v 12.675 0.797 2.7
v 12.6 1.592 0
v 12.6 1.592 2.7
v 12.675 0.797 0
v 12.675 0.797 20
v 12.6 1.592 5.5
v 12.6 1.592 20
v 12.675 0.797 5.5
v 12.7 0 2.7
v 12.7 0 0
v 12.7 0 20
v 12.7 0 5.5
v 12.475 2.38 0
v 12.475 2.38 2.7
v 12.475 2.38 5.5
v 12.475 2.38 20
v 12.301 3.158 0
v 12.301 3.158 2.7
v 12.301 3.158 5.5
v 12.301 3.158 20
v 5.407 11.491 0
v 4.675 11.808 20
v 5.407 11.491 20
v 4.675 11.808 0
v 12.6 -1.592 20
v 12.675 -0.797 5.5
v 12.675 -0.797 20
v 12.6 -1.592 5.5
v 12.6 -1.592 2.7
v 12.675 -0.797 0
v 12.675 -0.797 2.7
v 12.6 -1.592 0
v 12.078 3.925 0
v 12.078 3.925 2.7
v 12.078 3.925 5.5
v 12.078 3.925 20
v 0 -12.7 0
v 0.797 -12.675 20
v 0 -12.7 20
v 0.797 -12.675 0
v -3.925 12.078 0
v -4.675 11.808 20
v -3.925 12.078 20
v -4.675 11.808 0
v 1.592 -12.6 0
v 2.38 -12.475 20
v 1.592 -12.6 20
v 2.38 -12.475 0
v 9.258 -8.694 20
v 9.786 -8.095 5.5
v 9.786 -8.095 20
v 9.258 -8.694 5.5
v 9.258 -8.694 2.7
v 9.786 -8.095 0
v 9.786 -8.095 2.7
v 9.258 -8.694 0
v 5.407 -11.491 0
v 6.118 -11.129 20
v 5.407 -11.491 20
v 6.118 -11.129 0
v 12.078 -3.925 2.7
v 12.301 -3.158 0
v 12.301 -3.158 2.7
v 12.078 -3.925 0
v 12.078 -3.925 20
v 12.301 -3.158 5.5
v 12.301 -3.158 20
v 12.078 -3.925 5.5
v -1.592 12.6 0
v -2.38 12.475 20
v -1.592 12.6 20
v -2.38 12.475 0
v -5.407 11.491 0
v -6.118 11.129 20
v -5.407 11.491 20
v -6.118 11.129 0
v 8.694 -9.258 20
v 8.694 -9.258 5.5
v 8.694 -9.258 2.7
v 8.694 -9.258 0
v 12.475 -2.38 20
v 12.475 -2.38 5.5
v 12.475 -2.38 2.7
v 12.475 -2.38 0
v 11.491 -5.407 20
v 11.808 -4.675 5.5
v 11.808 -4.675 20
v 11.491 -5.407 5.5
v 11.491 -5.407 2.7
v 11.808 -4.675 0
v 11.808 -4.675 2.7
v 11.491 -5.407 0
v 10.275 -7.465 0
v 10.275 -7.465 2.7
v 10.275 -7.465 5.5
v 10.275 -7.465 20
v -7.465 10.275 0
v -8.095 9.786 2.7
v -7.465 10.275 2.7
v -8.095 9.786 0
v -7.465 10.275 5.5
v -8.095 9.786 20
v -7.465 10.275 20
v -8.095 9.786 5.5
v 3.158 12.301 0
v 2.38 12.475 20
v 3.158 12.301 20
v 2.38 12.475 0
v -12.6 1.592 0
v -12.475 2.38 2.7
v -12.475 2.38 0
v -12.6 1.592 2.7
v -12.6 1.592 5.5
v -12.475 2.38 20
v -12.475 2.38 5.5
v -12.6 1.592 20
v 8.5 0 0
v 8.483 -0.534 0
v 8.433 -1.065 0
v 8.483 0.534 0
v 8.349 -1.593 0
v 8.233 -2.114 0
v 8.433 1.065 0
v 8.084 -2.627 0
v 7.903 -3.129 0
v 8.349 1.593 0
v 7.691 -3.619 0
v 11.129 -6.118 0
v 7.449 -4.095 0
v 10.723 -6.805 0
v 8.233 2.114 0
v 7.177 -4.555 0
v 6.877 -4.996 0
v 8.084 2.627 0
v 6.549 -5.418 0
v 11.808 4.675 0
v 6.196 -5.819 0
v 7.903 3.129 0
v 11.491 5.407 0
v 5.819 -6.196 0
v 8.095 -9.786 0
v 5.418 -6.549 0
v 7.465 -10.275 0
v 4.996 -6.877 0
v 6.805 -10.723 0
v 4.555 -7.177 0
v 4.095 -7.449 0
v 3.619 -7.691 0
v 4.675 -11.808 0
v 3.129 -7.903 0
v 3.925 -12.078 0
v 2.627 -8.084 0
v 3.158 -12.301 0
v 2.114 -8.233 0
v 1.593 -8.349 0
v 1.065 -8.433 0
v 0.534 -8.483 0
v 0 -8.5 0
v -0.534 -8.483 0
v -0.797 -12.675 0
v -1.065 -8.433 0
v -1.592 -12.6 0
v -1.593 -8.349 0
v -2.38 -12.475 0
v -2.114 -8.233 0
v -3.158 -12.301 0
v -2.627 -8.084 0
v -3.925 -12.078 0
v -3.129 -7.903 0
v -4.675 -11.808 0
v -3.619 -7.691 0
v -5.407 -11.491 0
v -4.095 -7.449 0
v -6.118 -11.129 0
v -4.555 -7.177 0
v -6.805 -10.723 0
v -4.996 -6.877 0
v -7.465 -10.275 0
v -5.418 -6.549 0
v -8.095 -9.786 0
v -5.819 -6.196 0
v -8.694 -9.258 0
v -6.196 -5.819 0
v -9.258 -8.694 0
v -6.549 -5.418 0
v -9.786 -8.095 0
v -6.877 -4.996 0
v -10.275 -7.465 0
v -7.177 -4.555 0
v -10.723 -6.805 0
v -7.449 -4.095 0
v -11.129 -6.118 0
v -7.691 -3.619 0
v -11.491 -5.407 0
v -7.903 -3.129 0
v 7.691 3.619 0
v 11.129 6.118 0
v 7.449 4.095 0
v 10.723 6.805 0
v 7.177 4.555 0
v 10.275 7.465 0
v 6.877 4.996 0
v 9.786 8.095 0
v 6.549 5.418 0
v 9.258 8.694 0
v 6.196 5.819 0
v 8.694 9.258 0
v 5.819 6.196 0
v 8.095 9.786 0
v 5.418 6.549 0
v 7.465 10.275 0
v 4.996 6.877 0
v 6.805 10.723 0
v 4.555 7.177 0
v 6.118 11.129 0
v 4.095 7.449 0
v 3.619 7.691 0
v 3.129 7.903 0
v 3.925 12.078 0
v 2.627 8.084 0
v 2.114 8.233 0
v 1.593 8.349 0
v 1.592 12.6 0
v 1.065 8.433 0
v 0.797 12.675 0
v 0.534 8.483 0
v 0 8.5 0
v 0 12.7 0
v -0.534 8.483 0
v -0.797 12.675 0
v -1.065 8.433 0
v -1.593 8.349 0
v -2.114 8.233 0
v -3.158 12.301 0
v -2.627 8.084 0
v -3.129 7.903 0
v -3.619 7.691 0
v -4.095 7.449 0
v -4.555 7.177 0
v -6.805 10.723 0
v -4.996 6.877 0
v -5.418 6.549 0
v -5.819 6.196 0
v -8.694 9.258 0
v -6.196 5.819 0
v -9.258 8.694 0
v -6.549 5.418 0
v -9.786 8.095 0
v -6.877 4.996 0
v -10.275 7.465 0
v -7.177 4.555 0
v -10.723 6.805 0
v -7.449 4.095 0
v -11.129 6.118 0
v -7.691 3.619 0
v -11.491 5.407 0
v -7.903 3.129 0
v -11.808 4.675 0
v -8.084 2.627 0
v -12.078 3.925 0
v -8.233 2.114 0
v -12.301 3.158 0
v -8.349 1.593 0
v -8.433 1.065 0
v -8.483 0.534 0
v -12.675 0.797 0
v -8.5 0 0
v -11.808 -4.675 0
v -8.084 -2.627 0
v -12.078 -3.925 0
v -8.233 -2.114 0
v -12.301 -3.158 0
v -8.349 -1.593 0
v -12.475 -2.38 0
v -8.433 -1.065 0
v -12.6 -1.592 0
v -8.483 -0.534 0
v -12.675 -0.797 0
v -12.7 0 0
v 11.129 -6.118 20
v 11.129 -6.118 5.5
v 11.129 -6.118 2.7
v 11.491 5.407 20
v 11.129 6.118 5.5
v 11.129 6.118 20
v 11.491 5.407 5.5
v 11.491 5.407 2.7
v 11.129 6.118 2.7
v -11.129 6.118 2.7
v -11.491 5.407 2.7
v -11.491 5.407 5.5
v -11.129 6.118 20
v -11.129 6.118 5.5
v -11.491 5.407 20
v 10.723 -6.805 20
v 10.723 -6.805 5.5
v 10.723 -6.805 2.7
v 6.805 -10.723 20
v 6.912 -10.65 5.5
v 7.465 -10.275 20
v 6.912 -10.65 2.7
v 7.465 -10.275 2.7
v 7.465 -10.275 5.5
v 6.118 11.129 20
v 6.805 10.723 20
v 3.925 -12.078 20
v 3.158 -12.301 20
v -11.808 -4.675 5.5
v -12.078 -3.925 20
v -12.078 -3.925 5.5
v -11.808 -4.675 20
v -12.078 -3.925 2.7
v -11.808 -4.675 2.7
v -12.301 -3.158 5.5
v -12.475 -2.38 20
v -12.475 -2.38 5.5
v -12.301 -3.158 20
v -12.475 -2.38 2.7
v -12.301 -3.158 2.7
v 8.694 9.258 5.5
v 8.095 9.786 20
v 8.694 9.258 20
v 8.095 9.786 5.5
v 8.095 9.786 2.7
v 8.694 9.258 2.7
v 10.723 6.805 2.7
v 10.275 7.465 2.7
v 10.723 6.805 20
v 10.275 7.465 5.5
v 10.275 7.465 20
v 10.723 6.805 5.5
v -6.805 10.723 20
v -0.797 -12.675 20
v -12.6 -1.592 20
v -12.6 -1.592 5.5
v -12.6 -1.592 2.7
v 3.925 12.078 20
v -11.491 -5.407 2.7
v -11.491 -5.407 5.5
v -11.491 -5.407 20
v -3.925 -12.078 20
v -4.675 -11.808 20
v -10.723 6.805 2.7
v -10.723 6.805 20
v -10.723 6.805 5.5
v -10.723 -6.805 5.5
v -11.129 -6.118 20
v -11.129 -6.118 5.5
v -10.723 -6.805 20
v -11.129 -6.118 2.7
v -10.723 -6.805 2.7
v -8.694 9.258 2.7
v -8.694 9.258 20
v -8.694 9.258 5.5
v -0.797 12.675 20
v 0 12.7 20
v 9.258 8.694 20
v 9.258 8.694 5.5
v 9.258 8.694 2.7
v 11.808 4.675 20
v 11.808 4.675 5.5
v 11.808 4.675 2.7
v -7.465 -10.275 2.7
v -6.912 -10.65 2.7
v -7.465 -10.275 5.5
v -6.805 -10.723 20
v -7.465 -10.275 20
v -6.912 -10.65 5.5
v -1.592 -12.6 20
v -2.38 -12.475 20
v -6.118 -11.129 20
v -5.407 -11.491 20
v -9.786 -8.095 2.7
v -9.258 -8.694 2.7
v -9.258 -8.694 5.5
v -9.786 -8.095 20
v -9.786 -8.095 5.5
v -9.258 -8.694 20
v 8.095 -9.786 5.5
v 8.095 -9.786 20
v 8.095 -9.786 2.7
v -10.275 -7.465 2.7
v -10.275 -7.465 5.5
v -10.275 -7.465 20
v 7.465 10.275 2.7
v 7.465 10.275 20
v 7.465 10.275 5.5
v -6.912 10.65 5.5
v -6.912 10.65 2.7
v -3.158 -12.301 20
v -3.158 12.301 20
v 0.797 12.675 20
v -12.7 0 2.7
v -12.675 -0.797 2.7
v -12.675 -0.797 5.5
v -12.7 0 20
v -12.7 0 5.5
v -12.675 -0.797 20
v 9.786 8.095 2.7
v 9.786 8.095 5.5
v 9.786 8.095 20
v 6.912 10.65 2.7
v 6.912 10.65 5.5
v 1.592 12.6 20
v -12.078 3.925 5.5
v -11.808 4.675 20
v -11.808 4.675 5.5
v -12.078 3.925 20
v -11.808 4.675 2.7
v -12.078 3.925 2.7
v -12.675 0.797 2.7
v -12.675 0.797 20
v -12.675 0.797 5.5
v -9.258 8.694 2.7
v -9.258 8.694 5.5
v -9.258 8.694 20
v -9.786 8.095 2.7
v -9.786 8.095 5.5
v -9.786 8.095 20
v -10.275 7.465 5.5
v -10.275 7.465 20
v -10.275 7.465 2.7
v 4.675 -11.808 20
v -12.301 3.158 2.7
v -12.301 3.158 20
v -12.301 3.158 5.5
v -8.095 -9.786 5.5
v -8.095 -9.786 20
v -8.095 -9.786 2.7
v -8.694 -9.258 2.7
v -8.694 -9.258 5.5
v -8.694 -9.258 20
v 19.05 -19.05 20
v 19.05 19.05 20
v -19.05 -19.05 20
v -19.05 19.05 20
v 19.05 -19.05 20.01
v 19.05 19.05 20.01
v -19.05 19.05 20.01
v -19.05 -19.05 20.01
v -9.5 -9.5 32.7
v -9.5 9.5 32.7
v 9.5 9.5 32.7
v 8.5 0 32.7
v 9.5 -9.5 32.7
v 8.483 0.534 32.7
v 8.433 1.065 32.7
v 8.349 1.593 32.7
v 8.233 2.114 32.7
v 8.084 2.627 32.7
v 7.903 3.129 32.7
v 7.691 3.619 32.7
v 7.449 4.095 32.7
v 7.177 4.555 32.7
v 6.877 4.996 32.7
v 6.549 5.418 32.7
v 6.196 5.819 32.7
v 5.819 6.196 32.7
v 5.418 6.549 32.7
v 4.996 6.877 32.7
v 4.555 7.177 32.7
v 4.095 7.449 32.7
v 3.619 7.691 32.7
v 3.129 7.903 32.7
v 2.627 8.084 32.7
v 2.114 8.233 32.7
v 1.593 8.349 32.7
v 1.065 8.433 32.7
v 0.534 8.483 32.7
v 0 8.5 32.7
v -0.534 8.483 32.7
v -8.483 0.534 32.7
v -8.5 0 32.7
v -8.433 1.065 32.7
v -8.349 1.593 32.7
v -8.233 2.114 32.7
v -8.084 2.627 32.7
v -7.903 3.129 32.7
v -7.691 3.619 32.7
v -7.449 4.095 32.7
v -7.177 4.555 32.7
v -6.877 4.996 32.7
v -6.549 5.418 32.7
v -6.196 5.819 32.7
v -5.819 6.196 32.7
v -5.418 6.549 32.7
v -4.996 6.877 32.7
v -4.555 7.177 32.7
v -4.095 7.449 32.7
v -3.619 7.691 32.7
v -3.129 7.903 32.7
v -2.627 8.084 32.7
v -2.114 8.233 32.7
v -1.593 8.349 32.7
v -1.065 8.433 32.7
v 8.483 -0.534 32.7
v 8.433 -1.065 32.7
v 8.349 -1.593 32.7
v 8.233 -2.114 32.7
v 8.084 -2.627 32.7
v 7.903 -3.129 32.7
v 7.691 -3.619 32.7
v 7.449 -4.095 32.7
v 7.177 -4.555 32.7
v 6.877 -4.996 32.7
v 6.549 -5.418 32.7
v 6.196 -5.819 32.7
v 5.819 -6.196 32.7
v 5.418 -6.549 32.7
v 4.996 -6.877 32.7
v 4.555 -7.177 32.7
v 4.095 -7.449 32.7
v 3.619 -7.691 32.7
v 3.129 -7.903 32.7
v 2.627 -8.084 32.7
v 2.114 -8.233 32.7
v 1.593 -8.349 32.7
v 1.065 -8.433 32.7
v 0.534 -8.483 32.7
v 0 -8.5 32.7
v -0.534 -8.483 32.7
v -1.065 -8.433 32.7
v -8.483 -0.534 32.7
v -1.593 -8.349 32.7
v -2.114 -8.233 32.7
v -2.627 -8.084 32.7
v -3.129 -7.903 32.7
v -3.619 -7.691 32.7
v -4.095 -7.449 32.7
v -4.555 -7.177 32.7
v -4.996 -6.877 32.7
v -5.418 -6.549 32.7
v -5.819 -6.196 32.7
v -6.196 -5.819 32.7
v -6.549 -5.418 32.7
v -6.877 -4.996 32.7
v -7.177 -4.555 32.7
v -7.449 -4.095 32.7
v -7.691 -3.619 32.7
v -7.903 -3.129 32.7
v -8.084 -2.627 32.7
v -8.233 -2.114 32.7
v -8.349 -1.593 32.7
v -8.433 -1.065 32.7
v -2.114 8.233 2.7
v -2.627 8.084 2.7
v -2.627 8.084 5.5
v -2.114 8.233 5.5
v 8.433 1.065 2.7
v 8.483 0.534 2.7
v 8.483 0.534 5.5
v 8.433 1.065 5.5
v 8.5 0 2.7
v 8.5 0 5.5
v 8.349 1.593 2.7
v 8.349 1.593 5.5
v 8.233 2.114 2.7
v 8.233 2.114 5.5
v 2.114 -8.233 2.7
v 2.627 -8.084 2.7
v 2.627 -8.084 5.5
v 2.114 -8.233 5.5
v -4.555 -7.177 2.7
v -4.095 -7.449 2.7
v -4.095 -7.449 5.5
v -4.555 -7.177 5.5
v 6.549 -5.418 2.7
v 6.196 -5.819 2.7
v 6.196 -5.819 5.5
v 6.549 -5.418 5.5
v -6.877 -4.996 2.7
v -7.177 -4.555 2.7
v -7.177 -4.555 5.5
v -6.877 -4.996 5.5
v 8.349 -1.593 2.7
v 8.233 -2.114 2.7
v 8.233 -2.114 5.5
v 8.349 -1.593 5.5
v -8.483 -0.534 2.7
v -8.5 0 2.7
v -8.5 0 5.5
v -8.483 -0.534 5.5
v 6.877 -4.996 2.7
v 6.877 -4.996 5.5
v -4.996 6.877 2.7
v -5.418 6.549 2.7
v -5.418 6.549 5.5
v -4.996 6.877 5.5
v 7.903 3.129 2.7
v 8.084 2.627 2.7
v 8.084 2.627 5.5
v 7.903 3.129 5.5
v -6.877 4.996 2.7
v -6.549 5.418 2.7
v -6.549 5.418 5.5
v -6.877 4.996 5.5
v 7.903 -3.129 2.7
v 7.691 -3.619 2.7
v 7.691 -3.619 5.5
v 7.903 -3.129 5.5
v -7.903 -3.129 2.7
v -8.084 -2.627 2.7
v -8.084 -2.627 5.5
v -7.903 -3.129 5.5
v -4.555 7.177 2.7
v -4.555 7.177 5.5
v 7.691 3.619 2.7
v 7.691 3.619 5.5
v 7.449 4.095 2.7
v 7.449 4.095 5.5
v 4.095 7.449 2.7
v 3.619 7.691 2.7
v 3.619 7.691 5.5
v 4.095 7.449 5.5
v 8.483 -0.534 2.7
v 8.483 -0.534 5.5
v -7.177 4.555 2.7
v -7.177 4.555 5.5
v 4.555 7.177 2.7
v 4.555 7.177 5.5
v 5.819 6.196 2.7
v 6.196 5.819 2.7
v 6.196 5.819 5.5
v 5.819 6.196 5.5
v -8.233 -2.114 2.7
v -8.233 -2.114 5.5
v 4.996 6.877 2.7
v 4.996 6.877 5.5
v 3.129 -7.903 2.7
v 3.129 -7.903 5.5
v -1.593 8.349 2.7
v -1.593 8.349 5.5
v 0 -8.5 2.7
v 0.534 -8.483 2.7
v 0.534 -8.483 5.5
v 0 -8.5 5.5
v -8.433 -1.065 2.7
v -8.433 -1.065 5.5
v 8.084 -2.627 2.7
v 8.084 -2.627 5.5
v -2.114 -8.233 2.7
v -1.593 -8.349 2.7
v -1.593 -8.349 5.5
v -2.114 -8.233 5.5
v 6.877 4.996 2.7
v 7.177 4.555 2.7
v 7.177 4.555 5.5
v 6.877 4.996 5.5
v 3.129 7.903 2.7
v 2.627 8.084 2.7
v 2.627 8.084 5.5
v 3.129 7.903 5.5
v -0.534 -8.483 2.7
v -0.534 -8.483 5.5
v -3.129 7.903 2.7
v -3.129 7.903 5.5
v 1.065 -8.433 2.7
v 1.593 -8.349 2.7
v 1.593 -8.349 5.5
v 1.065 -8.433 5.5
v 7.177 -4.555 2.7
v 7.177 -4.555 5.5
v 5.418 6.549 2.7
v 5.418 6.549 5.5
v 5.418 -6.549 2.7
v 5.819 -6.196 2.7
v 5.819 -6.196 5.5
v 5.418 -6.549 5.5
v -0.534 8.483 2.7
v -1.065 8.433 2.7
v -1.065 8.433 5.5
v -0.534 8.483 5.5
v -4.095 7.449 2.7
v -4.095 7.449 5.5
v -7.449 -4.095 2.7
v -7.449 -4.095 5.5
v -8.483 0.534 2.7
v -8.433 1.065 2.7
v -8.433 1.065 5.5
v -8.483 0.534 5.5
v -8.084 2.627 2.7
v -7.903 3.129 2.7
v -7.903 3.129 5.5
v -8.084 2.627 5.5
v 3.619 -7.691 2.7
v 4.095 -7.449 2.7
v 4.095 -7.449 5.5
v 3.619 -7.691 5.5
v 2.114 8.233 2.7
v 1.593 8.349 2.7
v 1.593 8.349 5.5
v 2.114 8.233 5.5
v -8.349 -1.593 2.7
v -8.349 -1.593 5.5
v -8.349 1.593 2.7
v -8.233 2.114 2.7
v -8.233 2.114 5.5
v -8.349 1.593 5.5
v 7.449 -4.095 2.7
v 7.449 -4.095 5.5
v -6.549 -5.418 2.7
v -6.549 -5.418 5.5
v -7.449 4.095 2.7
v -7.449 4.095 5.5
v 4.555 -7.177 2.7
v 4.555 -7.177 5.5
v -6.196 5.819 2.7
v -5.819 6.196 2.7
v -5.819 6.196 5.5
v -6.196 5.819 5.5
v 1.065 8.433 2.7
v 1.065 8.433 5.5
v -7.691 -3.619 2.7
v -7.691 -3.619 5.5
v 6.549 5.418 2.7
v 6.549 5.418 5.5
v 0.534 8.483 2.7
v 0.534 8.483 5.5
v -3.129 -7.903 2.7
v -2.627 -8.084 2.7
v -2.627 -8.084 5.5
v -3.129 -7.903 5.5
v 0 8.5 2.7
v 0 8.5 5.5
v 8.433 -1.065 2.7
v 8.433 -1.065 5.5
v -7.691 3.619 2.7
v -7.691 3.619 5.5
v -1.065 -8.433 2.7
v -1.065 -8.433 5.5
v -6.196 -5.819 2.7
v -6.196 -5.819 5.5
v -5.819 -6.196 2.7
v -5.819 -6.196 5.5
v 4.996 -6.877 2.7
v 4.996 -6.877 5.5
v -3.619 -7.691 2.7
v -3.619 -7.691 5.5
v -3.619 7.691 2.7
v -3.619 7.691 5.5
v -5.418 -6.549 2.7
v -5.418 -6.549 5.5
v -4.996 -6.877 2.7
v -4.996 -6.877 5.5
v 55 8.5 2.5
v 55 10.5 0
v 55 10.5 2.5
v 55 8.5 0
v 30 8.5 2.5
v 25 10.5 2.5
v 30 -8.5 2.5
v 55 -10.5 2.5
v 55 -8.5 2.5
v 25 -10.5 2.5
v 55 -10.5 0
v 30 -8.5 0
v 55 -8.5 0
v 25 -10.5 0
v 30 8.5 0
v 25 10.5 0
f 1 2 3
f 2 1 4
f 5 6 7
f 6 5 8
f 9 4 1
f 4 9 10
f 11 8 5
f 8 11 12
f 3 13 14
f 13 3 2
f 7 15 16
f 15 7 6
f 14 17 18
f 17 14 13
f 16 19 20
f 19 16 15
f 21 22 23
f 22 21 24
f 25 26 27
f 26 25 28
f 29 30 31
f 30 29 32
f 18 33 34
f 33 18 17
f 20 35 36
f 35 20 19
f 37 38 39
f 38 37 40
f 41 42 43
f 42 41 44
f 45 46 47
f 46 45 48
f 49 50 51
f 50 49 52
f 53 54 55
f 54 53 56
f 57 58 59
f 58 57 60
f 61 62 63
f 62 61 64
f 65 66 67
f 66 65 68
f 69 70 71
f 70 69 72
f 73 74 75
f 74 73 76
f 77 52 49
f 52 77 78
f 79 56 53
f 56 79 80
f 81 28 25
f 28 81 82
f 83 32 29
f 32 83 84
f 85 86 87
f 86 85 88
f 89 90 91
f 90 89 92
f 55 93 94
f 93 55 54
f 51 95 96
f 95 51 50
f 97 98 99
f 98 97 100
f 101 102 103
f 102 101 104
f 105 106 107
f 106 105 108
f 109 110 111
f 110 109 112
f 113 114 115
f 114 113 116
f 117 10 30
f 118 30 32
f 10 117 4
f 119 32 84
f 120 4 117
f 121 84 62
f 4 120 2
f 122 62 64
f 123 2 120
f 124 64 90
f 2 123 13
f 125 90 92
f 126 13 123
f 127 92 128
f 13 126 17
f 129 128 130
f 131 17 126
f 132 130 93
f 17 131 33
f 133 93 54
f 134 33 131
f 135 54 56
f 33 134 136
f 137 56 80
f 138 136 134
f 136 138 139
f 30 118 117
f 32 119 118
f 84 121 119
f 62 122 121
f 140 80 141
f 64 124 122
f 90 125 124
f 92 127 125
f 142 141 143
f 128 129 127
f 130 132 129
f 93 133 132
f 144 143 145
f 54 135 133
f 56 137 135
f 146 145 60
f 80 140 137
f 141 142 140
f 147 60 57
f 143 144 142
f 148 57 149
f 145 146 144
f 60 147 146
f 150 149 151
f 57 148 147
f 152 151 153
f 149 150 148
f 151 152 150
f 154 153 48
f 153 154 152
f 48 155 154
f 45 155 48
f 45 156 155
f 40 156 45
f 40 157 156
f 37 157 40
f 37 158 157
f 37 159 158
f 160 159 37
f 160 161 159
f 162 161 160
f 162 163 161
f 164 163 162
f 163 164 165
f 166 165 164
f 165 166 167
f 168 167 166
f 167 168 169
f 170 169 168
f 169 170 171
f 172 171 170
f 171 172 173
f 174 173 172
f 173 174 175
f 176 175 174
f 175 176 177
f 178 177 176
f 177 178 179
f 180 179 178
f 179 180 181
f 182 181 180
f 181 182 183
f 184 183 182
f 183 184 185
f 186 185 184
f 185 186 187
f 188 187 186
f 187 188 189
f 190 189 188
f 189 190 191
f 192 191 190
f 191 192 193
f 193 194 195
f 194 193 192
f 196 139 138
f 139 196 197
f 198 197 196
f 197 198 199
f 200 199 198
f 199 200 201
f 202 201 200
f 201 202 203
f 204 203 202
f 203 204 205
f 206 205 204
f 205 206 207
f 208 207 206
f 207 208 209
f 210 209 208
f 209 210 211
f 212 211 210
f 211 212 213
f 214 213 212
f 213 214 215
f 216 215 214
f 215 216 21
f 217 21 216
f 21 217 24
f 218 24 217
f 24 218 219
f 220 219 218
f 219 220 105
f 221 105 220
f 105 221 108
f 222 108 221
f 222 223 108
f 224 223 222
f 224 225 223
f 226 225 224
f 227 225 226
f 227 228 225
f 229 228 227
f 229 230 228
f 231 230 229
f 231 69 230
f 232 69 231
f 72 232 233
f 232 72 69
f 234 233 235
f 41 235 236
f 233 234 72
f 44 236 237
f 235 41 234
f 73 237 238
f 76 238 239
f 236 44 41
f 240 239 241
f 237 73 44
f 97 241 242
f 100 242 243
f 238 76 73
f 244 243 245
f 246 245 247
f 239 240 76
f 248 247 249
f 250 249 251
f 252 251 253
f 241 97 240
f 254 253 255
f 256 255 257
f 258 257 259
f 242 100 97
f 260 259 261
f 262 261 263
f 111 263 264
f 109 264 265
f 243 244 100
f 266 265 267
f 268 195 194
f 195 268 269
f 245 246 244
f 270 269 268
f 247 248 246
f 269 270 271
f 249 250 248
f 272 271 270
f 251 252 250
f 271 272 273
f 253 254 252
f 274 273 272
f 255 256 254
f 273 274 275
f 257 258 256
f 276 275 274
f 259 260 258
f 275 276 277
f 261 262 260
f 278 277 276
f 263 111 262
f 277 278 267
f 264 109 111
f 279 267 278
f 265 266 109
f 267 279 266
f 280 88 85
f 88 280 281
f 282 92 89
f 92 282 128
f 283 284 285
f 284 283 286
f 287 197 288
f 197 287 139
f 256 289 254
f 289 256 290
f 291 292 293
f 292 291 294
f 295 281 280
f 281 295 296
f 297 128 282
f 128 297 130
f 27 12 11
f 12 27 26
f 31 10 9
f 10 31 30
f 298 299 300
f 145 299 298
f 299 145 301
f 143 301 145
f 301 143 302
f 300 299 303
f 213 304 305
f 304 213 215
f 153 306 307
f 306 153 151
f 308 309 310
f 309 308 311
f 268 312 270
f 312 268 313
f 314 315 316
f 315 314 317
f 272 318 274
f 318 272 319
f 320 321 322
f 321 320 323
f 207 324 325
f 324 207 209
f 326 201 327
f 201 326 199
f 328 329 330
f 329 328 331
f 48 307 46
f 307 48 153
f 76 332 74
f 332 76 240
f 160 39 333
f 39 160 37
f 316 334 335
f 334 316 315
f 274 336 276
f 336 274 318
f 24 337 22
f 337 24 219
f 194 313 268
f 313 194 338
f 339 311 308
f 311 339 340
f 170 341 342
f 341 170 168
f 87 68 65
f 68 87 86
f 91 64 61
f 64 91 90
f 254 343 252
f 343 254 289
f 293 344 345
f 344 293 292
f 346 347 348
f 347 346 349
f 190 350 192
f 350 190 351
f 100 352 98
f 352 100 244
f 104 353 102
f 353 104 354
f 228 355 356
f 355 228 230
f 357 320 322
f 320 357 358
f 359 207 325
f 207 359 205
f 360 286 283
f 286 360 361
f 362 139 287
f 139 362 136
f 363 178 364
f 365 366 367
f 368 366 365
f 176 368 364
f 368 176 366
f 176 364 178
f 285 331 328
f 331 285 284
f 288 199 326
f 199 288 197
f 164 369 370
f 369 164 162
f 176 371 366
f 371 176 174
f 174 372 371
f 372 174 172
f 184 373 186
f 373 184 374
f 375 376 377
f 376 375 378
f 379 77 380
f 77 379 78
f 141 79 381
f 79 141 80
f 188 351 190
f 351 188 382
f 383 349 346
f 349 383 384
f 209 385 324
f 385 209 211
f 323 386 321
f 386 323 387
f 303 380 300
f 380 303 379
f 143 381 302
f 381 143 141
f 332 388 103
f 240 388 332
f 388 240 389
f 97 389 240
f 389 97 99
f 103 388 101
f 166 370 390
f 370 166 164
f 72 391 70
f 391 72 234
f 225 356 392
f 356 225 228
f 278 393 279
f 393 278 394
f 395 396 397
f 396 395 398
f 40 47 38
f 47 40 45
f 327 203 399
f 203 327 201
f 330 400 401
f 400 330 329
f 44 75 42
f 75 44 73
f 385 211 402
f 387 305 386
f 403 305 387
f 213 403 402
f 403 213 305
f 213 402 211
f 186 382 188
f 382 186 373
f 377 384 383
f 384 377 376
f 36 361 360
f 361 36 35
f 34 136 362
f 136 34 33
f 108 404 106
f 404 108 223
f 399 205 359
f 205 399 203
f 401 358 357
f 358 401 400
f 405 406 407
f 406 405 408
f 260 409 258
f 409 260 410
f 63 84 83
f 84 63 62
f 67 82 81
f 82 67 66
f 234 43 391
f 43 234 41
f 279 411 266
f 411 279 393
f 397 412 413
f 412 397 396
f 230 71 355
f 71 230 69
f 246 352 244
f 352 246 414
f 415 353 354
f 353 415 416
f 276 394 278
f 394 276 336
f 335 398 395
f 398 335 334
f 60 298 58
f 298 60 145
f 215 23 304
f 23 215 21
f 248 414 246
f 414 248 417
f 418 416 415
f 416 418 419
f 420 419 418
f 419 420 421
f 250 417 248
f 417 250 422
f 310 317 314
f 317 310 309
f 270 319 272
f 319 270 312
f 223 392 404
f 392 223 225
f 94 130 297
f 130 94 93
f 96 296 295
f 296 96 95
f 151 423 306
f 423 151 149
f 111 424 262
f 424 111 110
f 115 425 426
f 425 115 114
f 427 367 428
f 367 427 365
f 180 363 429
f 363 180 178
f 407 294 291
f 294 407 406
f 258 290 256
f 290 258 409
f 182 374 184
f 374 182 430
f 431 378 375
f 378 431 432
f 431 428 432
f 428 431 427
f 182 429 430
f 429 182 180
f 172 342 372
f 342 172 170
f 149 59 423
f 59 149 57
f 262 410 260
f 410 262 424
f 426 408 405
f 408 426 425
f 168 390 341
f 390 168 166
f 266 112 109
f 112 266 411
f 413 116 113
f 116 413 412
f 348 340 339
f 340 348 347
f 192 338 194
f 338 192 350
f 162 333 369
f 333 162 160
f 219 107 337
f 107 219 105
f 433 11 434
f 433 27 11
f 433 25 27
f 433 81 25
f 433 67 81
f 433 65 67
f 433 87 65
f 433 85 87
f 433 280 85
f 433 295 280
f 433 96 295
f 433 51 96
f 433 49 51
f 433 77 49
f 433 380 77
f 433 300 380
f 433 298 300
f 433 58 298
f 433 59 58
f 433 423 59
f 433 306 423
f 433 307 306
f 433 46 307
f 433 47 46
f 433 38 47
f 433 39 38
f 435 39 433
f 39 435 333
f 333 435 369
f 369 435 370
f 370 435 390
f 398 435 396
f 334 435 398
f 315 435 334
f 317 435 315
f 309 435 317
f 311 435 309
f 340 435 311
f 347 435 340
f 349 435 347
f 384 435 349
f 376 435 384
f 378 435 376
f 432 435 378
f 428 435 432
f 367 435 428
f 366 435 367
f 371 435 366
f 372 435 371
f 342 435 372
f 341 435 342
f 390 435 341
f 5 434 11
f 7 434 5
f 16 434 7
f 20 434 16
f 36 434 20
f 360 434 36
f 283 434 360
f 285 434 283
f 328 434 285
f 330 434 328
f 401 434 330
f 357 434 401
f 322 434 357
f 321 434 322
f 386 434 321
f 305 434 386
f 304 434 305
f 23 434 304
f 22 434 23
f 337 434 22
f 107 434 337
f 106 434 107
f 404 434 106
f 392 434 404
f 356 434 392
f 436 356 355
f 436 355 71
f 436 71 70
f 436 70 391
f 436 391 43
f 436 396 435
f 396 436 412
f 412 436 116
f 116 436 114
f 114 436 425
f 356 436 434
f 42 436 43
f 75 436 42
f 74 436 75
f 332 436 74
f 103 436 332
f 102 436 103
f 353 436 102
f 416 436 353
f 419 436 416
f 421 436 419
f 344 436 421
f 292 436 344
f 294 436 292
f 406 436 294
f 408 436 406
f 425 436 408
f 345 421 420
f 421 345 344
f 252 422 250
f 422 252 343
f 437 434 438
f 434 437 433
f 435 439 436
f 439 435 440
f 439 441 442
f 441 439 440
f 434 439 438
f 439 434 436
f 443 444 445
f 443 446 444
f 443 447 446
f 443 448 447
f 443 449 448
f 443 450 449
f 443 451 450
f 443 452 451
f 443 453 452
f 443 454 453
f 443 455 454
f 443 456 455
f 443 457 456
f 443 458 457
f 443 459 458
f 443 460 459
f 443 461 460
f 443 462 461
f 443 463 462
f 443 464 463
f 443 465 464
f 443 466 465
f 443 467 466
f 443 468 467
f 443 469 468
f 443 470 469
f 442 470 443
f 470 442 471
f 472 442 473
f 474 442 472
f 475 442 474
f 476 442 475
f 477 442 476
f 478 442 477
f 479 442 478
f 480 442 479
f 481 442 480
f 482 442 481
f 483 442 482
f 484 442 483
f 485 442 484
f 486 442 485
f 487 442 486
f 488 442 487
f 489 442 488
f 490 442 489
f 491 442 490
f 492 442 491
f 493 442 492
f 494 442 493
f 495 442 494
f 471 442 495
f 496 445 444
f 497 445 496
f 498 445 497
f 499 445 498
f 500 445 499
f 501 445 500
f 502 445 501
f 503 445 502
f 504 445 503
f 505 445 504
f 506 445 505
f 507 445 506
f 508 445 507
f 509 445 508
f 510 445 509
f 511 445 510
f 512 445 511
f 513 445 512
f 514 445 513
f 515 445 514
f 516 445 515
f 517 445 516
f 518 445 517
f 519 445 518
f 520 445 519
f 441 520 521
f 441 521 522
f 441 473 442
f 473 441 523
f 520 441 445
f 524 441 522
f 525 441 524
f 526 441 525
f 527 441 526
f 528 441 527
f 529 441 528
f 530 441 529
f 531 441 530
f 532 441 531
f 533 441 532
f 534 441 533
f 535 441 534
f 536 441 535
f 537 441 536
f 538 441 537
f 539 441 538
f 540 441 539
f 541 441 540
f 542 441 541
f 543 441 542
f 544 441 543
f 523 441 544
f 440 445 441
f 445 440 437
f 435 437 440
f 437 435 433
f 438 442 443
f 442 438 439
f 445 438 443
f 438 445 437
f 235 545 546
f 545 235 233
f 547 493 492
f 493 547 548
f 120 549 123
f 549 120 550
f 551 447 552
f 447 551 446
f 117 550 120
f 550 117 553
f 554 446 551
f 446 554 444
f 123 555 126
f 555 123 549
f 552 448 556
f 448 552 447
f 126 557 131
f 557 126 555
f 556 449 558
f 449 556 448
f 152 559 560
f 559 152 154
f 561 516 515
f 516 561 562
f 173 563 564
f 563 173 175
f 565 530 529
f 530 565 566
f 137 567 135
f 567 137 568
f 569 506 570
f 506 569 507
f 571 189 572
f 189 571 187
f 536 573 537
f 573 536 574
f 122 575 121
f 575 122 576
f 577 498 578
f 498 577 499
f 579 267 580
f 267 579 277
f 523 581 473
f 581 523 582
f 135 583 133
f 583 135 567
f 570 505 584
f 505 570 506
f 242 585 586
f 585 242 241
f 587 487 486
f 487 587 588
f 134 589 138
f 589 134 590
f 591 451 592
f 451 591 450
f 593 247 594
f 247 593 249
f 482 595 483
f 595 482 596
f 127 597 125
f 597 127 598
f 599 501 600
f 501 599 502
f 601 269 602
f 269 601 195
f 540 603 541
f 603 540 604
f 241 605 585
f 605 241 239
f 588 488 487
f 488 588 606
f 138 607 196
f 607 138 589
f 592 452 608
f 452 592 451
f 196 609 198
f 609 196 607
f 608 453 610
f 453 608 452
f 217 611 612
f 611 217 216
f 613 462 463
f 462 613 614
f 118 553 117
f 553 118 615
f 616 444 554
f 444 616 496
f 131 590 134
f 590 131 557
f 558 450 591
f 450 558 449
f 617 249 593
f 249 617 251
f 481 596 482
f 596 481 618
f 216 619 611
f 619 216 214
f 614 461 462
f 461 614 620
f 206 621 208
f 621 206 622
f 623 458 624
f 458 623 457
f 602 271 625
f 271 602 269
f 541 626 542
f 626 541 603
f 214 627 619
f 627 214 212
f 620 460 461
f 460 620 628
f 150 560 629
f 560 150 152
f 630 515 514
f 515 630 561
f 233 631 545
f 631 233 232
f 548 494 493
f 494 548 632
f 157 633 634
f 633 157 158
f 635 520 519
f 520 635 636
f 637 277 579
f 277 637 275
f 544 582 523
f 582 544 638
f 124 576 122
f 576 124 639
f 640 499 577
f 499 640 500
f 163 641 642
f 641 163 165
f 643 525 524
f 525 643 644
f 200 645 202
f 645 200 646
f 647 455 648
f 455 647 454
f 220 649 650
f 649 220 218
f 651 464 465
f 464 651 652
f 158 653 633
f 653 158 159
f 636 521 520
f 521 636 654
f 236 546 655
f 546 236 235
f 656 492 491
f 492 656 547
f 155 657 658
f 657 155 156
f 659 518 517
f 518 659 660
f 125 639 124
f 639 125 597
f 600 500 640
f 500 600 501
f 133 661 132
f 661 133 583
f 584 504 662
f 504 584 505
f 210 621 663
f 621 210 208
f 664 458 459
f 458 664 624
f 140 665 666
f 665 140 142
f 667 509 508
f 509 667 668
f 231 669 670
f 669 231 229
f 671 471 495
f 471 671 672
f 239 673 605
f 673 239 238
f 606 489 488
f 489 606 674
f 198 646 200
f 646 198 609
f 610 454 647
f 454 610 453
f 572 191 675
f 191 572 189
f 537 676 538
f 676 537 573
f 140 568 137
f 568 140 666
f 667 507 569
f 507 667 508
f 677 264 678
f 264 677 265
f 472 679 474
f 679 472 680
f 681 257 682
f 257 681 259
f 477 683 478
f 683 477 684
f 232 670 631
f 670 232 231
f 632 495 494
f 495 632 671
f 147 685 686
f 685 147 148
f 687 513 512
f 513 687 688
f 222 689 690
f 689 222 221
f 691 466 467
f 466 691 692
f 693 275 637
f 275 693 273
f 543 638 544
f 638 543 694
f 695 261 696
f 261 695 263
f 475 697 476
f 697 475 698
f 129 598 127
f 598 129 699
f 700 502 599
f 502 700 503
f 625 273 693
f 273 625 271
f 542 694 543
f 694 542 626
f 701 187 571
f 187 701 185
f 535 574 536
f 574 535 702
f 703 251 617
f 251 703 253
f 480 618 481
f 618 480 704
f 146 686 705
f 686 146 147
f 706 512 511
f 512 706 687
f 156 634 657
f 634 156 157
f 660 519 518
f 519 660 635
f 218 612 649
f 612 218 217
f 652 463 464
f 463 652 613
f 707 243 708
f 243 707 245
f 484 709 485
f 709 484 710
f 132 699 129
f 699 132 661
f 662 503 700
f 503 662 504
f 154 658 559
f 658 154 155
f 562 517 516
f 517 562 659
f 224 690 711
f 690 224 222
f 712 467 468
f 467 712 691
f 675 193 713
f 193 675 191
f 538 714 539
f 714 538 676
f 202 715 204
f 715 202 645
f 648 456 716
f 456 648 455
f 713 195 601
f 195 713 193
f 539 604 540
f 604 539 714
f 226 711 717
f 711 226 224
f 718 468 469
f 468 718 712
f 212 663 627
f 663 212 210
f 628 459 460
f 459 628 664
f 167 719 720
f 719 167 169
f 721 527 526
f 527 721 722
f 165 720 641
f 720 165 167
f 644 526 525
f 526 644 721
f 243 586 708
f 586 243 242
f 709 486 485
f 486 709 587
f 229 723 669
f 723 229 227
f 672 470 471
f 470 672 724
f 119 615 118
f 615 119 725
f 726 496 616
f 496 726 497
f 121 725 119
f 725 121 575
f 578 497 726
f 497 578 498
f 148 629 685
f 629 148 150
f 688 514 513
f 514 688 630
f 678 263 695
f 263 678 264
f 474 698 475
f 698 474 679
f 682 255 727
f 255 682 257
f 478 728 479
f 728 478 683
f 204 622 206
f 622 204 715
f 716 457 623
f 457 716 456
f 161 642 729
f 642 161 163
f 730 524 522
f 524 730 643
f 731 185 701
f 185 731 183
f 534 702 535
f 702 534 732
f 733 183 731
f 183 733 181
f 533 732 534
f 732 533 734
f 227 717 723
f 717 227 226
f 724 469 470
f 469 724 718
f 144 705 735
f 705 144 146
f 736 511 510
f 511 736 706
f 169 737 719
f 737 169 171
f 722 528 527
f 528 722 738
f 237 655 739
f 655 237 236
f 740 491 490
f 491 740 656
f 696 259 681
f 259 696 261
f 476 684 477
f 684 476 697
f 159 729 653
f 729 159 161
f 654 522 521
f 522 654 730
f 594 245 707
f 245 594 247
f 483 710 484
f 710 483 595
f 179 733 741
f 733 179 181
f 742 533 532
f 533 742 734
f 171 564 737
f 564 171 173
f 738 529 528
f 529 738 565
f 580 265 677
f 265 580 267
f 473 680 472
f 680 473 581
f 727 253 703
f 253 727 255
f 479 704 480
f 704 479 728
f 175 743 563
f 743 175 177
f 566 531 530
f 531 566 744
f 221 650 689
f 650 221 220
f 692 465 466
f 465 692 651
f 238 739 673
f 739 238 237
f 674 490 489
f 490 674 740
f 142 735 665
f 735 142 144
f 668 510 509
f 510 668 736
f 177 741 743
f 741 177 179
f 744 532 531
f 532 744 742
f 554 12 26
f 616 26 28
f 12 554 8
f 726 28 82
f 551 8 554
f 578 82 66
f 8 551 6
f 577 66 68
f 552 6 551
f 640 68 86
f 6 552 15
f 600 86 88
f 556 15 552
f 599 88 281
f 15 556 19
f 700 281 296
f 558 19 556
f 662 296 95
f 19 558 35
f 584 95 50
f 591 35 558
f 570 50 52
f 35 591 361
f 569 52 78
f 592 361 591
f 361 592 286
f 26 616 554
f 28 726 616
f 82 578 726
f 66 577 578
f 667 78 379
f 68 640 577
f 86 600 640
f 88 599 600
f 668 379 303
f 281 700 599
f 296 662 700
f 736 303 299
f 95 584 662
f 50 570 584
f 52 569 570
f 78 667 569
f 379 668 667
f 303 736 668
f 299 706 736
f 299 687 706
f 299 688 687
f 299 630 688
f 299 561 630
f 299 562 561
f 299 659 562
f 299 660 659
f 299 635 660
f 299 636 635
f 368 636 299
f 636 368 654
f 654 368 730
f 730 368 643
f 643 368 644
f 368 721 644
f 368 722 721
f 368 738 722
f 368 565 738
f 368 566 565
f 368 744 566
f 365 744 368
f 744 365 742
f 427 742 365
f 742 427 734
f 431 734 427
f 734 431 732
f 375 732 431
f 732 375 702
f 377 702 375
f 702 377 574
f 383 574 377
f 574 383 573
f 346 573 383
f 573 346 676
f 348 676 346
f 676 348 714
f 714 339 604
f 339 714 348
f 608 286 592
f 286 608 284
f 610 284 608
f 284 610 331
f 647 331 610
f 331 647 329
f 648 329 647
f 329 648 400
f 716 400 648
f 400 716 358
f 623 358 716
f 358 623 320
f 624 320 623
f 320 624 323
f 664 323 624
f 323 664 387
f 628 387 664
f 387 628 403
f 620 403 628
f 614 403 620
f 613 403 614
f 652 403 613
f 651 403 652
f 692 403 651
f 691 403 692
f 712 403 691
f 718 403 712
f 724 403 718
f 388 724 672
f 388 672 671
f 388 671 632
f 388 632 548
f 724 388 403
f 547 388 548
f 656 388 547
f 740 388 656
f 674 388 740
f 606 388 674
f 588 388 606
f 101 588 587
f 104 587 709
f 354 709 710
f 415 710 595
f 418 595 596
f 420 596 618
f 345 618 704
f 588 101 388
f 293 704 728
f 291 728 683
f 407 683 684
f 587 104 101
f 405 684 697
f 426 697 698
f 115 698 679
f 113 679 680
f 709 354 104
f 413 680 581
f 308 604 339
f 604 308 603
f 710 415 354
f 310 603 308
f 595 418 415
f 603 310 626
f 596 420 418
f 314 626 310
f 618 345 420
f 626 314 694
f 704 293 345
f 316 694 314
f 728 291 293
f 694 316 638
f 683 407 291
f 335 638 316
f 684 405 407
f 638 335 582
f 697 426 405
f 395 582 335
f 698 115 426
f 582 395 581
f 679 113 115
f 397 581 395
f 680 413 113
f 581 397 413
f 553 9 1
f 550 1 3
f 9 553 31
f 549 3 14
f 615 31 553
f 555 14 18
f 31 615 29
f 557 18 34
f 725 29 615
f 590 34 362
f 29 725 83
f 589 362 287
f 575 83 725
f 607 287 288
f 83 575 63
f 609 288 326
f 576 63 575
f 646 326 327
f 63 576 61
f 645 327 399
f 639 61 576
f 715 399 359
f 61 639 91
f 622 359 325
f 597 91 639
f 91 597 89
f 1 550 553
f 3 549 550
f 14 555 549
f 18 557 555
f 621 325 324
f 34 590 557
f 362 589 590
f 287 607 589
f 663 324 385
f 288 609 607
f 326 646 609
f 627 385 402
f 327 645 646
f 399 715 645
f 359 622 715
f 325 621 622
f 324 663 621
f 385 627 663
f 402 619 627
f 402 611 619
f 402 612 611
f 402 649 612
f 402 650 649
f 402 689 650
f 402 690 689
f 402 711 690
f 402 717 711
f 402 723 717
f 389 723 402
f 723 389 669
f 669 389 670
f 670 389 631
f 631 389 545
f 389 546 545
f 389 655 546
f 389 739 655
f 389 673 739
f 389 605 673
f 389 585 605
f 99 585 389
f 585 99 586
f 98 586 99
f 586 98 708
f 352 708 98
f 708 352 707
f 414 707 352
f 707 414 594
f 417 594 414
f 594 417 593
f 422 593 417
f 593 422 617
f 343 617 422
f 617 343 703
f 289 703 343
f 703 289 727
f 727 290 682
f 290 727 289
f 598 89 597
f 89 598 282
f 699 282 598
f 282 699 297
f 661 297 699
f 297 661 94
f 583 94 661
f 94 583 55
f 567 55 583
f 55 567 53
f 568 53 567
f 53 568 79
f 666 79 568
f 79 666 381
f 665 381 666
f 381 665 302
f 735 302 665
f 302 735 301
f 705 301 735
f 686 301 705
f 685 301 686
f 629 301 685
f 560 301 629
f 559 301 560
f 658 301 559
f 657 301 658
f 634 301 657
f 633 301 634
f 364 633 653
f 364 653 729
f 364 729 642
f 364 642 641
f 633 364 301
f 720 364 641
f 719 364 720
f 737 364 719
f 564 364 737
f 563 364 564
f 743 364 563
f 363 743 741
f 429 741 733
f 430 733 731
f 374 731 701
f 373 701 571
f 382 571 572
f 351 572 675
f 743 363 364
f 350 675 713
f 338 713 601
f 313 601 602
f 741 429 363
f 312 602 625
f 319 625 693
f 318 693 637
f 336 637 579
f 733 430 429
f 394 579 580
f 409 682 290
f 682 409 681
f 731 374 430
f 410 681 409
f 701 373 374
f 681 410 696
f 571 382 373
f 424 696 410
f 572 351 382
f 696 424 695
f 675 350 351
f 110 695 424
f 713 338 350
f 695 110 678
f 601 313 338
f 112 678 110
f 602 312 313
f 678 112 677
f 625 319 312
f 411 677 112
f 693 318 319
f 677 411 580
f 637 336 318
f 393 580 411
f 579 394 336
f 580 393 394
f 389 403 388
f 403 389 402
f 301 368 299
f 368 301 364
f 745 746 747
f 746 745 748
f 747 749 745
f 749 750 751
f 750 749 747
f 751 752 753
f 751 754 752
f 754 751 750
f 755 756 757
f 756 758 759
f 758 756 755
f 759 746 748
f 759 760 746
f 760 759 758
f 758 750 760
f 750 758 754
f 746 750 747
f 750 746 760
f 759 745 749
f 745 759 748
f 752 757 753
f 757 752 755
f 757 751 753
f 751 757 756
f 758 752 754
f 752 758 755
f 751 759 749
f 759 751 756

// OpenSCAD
// Tubing Port

tubing_od = 17;   // 5/16" = 7.9375mm
cyl_od = 25.4;       // 1/2" = 12.7mm
cyl_h = 20;

frustum_bot_side = 1.5 * 25.4;        // 1" = 25.4mm
frustum_top_side = 19;      // 1/2" = 12.7mm
frustum_h = 1/2 * 25.4;             // 1/2" = 12.7mm

// U-clip parameters
clip_arm_w = 2;                    // width of each arm (Y)
clip_thickness = 2.5;                  // height of arms (Z)
clip_gap = tubing_od;  // inner gap, at least 5/16" clearance
clip_length = 30;                    // total arm length (X)
clip_bridge = 5;                     // bridge width at closed end (X)
clip_y_total = clip_arm_w * 2 + clip_gap;

slot_top_z = cyl_h - 14.5;              // top of slot 14.5mm below frustum base
slot_tol = 0.3;

module u_clip() {
    // Arm 1
    translate([-clip_length/2, clip_gap/2, 0])
        cube([clip_length, clip_arm_w, clip_thickness]);
    // Arm 2
    translate([-clip_length/2, -clip_gap/2 - clip_arm_w, 0])
        cube([clip_length, clip_arm_w, clip_thickness]);
    // Bridge (closed end of U)
    translate([-clip_length/2, -clip_gap/2 - clip_arm_w, 0])
        cube([clip_bridge, clip_y_total, clip_thickness]);
}

// Main piece with slot
difference() {
    union() {
        // Cylinder
        cylinder(d=cyl_od, h=cyl_h, $fn=100);

        // Square pyramid frustum on top
        translate([0, 0, cyl_h])
            hull() {
                translate([0, 0, 0.005])
                    cube([frustum_bot_side, frustum_bot_side, 0.01], center=true);
                translate([0, 0, frustum_h - 0.005])
                    cube([frustum_top_side, frustum_top_side, 0.01], center=true);
            }
    }

    // 5/16" through hole for tubing
    translate([0, 0, -0.05])
        cylinder(d=tubing_od, h=cyl_h + frustum_h + 0.1, $fn=100);

    // Slot for U-clip
    translate([0, 0, slot_top_z - (clip_thickness + slot_tol)/2])
        cube([clip_length, clip_y_total + slot_tol, clip_thickness + slot_tol], center=true);
}

// U-clip for separate printing (shown offset to the side)
translate([40, 0, 0])
    u_clip();
